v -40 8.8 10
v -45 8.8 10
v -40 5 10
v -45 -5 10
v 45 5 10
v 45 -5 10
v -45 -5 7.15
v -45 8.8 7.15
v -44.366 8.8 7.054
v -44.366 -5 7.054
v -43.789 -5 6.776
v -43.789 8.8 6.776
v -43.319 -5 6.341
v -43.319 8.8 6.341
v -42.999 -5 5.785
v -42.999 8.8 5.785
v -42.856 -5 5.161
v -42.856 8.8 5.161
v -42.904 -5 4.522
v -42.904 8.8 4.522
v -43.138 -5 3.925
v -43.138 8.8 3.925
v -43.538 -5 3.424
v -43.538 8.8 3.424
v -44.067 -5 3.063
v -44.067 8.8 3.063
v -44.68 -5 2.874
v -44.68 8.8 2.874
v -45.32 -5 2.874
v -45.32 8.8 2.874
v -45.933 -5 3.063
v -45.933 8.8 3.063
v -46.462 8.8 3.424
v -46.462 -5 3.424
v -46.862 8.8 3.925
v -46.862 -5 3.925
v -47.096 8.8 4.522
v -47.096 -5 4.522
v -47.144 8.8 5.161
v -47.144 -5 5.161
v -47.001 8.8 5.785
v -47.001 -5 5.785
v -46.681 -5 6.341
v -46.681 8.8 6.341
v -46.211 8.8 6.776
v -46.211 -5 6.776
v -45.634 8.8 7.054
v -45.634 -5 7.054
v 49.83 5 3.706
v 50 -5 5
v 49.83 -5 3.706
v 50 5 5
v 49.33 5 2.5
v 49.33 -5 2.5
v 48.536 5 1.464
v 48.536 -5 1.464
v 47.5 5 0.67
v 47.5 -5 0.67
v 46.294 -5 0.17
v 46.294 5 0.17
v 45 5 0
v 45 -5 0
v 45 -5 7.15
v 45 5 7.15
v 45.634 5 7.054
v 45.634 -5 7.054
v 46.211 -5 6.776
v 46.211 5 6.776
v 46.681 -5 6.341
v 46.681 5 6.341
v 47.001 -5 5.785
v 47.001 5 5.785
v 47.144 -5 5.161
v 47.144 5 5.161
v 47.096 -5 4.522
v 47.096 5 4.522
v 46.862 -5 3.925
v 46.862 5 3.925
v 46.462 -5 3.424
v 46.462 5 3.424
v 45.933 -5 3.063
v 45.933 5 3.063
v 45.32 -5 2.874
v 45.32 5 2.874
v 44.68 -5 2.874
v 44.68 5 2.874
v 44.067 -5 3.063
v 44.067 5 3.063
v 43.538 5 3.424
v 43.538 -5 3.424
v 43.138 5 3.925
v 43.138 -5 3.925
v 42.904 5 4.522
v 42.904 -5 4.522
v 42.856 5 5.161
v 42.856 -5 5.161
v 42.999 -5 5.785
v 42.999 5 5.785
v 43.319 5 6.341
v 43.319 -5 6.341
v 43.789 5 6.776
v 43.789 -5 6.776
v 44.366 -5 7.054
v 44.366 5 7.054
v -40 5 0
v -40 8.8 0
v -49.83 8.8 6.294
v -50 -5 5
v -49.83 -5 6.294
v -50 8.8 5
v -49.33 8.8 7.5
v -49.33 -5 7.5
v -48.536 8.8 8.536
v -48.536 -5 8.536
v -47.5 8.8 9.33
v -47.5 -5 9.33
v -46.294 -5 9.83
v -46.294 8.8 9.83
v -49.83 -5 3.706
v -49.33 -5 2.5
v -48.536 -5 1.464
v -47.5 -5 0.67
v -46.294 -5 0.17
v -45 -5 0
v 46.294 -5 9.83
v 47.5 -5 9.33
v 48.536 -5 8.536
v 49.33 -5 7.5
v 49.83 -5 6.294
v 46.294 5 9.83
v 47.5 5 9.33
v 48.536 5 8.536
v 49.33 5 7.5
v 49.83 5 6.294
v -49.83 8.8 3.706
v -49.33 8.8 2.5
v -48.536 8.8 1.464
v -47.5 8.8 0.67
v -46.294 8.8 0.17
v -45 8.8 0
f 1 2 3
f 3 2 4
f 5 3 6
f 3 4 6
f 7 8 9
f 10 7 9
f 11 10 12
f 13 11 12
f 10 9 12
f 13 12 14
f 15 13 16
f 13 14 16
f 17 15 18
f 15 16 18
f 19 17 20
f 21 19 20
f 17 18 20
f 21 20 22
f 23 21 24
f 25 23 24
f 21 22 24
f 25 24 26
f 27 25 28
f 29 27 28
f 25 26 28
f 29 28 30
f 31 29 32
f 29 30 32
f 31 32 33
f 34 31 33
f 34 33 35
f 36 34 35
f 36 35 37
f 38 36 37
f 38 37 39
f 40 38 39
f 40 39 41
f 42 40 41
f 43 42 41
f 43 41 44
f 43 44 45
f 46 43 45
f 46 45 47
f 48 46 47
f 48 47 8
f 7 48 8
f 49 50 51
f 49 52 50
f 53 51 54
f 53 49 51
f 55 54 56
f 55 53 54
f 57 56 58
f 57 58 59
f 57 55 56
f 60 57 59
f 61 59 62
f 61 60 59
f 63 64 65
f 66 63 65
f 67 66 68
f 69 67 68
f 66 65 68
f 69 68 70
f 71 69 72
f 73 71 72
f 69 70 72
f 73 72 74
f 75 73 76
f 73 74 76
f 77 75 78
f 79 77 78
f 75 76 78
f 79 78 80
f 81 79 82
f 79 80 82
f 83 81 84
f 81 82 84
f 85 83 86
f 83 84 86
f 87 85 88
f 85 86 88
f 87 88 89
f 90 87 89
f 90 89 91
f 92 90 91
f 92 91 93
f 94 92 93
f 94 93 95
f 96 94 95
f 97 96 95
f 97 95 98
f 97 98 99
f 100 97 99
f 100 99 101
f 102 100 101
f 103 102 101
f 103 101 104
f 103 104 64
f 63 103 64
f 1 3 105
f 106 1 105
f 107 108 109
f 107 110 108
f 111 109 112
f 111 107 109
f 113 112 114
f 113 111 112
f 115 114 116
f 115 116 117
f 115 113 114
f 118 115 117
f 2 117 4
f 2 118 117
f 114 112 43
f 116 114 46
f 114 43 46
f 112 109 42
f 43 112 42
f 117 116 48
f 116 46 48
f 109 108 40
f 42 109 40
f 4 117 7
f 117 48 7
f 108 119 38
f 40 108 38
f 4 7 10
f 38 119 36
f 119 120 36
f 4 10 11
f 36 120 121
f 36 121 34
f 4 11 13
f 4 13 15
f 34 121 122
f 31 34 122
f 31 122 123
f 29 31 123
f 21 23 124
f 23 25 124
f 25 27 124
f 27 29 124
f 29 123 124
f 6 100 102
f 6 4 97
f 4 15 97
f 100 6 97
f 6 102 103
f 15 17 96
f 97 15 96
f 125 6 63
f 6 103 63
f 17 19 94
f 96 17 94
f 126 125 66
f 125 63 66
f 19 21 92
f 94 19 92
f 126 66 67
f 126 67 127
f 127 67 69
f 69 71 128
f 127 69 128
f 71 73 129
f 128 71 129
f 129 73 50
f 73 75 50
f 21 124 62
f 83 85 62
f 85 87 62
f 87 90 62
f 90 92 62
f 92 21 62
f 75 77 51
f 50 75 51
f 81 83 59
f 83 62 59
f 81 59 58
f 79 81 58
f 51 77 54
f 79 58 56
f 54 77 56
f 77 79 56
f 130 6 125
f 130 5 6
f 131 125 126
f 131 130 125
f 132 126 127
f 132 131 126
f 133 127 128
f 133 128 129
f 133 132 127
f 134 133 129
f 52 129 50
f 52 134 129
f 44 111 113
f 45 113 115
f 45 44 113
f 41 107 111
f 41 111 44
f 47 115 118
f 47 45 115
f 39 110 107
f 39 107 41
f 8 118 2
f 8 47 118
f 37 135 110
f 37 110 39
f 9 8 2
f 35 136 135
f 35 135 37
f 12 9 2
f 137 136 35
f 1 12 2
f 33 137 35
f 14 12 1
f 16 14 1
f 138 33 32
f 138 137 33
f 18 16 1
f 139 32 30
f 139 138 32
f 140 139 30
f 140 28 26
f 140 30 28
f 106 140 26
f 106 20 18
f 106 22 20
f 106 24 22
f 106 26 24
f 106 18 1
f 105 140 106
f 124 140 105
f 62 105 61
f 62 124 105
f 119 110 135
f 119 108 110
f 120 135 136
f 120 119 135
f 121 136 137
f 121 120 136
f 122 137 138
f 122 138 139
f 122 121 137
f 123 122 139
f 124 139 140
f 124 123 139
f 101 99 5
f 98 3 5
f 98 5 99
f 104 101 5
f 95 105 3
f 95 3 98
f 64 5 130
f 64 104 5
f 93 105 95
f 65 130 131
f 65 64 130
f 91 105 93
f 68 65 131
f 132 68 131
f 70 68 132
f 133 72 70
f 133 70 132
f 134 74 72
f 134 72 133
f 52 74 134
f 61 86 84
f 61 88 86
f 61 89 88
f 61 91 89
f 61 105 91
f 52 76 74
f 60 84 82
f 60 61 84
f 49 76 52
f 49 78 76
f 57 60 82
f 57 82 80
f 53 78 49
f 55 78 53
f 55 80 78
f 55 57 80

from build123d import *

# Parameters (mm, degrees)
SKETCH_1_W          = 100
SKETCH_1_H          = 10
EXTRUDE_1_DEPTH     = 10
SKETCH_4_W          = 10
SKETCH_4_H          = 10
EXTRUDE_2_DEPTH     = 3.8
FILLET_1_R          = 5
SKETCH_2_R          = 2.15
CUT_EXTRUDE_1_DEPTH = 53.824615474


with BuildPart() as part:
    # 스케치1 → 보스-돌출1 (new body)
    with BuildSketch(Plane.XY):
        Rectangle(SKETCH_1_W, SKETCH_1_H)
    extrude(amount=EXTRUDE_1_DEPTH)

    # 스케치4 → 보스-돌출2 (add)
    with BuildSketch(Plane(origin=(0, 5, 0), x_dir=(1, 0, 0), z_dir=(0, 1, 0))):
        with Locations((-45, -5)):
            Rectangle(SKETCH_4_W, SKETCH_4_H)
    extrude(amount=EXTRUDE_2_DEPTH)

    # 필렛1
    fillet_1_edges = [part.edges().sort_by_distance(p)[0] for p in [
        (50, 0, 0),
        (50, 0, 10),
        (-50, 1.9, 0),
        (-50, 1.9, 10),
    ]]
    fillet(fillet_1_edges, radius=FILLET_1_R - 0.0001)  # a hair under: the kernel refuses the full size

    # 스케치2 → 컷-돌출1 (cut, through all)
    with BuildSketch(Plane(origin=(0, 8.8, 0), x_dir=(1, 0, 0), z_dir=(0, 1, 0))):
        with Locations(Location((-45, -5, 0), (0, 0, 270))):
            Circle(SKETCH_2_R)
        with Locations(Location((45, -5, 0), (0, 0, 270))):
            Circle(SKETCH_2_R)
    extrude(amount=-CUT_EXTRUDE_1_DEPTH, mode=Mode.SUBTRACT)


solid = part.part
